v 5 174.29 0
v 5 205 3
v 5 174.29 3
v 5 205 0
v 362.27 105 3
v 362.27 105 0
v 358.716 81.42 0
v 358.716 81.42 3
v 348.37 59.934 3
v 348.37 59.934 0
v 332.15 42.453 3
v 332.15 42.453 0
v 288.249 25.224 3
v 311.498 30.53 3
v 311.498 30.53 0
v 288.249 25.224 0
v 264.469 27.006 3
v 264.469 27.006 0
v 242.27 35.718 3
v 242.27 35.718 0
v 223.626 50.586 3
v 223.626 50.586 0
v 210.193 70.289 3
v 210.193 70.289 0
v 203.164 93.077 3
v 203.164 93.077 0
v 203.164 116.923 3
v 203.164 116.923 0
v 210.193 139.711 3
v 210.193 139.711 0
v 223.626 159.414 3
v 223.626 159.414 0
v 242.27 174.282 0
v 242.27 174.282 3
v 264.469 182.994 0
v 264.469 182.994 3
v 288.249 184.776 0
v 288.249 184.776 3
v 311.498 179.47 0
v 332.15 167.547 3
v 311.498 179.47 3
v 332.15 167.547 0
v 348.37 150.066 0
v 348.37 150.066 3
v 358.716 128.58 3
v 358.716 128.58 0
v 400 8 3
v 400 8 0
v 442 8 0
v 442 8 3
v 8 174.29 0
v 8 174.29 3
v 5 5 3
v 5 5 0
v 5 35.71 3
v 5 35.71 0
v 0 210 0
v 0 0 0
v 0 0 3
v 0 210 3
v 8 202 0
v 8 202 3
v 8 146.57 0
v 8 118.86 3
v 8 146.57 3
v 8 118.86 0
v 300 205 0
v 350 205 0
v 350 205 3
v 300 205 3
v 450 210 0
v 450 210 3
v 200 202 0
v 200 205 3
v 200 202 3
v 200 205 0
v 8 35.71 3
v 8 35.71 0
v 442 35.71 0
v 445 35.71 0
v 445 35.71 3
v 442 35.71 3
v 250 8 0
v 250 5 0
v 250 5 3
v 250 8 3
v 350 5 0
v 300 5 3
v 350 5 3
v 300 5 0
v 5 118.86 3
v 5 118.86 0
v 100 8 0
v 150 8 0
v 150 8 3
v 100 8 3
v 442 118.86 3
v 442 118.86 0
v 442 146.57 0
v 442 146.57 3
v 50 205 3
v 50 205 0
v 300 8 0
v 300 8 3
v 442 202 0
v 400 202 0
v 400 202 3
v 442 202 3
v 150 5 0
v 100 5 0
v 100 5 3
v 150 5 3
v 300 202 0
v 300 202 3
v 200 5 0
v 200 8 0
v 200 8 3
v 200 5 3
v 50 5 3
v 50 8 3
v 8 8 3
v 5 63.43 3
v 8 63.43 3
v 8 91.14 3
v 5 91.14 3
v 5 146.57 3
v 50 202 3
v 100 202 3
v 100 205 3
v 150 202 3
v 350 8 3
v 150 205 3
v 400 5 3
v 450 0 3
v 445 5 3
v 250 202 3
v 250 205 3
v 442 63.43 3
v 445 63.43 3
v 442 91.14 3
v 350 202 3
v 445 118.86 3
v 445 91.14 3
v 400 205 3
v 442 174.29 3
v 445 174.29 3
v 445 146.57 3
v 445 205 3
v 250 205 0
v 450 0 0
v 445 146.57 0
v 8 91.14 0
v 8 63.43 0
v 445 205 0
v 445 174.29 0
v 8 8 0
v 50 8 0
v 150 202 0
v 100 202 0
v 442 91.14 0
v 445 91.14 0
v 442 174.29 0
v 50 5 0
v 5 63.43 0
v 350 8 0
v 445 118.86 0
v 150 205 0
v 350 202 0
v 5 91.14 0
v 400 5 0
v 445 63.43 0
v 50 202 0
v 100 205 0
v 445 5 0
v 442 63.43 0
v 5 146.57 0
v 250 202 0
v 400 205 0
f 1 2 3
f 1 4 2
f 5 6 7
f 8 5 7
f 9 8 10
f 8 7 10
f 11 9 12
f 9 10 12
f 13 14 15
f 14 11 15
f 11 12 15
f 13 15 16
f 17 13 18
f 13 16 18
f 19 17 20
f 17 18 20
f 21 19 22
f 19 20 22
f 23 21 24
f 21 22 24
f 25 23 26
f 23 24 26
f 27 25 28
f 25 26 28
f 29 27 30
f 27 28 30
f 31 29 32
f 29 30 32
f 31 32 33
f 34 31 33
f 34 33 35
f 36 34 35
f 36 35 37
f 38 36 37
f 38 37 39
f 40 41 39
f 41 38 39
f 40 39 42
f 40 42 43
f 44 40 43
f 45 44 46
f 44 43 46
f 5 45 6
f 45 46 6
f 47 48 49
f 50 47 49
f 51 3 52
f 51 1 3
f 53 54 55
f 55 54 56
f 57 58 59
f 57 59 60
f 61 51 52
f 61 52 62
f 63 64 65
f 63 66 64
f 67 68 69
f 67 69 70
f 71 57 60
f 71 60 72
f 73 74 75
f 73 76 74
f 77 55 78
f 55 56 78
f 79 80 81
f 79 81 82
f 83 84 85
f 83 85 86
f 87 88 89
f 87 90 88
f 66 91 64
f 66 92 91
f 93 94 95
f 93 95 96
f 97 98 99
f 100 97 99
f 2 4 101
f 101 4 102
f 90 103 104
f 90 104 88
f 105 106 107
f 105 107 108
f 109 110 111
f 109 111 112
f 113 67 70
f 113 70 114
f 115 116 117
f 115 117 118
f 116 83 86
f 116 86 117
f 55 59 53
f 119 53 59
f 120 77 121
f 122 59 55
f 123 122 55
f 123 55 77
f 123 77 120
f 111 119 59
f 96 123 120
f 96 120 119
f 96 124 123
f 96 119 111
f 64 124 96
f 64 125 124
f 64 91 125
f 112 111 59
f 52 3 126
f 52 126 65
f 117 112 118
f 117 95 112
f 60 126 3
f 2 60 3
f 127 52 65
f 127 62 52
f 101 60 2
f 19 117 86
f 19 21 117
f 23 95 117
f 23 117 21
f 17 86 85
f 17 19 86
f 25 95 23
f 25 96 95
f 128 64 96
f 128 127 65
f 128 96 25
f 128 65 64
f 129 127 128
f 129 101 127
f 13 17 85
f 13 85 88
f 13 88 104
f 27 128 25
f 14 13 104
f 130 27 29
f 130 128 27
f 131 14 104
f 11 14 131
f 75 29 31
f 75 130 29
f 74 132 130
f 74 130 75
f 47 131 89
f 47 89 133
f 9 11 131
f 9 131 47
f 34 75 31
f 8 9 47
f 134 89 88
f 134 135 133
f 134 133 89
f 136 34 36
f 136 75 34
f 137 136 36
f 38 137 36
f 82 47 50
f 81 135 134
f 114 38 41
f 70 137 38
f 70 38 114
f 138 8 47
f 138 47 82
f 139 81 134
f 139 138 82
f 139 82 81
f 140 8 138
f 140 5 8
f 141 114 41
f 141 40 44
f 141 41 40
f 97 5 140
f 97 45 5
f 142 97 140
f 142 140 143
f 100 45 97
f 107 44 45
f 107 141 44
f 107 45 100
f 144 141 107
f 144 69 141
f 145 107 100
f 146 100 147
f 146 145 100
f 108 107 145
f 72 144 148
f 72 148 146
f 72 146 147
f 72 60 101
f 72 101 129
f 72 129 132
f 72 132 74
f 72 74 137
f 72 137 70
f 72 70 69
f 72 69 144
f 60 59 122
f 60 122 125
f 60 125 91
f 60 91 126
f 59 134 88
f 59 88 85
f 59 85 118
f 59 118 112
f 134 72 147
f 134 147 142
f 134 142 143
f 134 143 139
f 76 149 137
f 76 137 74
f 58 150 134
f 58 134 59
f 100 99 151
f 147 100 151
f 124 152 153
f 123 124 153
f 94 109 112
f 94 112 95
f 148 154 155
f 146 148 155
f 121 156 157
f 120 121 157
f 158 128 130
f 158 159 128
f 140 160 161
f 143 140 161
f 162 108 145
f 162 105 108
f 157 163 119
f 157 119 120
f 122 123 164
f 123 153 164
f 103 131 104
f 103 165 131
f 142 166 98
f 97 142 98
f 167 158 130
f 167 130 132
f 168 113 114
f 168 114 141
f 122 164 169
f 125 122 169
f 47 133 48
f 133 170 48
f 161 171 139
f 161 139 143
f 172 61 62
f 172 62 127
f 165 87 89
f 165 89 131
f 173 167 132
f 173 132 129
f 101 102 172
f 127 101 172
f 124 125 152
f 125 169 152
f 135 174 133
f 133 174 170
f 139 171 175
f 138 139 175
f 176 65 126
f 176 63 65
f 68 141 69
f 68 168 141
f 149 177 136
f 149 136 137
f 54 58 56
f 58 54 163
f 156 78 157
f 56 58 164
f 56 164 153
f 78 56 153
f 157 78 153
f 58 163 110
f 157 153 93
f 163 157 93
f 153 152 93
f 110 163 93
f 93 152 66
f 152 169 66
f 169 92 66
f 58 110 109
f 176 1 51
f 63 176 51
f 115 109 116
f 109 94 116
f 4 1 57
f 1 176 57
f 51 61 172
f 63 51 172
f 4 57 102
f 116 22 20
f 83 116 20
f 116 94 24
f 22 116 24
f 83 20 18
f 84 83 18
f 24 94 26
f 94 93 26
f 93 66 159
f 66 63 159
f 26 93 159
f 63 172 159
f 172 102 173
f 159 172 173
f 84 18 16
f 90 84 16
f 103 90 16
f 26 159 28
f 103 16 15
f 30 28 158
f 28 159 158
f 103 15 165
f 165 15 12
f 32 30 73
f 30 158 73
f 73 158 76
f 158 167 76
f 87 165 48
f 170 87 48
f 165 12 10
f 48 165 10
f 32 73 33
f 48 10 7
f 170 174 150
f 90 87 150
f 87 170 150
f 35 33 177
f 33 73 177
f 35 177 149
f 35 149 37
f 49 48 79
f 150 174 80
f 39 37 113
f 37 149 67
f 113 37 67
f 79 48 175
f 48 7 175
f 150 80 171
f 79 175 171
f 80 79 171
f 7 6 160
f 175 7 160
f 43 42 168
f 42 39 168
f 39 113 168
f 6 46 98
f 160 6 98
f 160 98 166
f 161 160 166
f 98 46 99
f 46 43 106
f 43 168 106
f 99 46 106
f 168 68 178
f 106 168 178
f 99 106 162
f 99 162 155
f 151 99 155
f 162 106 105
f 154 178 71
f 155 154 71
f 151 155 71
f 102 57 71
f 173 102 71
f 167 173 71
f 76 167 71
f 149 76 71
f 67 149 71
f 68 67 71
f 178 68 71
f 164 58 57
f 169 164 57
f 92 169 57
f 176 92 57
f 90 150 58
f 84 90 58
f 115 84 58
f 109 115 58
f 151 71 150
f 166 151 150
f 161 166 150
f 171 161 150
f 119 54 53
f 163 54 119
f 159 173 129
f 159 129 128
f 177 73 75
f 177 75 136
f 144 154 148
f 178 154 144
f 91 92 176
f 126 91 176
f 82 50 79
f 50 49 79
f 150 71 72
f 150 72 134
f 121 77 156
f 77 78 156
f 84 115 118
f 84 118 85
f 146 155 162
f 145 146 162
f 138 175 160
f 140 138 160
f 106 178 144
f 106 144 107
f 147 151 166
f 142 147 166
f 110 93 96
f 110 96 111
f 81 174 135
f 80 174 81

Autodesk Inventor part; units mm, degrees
ref_plane "YZ Plane" through (0, 0, 0) normal (1, 0, 0) x (0, 1, 0)
ref_plane "XZ Plane" through (0, 0, 0) normal (0, 1, 0) x (-1, 0, 0)
ref_plane "XY Plane" through (0, 0, 0) normal (0, 0, 1) x (1, 0, 0)
sketch "Boceto1" plane through (0, 0, 0) normal (0, 0, 1) x (1, 0, 0)
  line L0 (0, 0) -> (0, 210)
  line L1 (0, 210) -> (450, 210)
  line L2 (450, 210) -> (450, 0)
  line L3 (450, 0) -> (0, 0)
  line L4 (0, 210) -> (5, 210)
  line L5 (5, 205) -> (50, 205)
  line L6 (50, 205) -> (50, 202)
  line L7 (5, 205) -> (5, 174.29)
  line L8 (5, 174.29) -> (8, 174.29)
  line L9 (8, 174.29) -> (8, 202)
  line L10 (8, 202) -> (50, 202)
  line L11 (0, 0) -> (5, 0)
  line L12 (0, 0) -> (5, 0)
  line L13 (5, 5) -> (50, 5)
  line L14 (5, 5) -> (5, 35.71)
  line L15 (5, 35.71) -> (8, 35.71)
  line L16 (50, 5) -> (50, 8)
  line L17 (8, 35.71) -> (8, 8)
  line L18 (8, 8) -> (50, 8)
  line L19 (450, 0) -> (445, 0)
  line L20 (445, 5) -> (445, 35.71)
  line L21 (445, 35.71) -> (442, 35.71)
  line L22 (445, 5) -> (400, 5)
  line L23 (400, 5) -> (400, 8)
  line L24 (400, 8) -> (442, 8)
  line L25 (442, 8) -> (442, 35.71)
  line L26 (450, 210) -> (445, 210)
  line L27 (445, 205) -> (400, 205)
  line L28 (445, 205) -> (445, 174.29)
  line L29 (445, 174.29) -> (442, 174.29)
  line L30 (400, 205) -> (400, 202)
  line L31 (400, 202) -> (442, 202)
  line L32 (442, 202) -> (442, 174.29)
  line L33 (5, 63.43) -> (5, 91.14)
  line L34 (5, 91.14) -> (8, 91.14)
  line L35 (8, 91.14) -> (8, 63.43)
  line L36 (8, 63.43) -> (5, 63.43)
  line L37 (5, 118.86) -> (5, 146.57)
  line L38 (5, 118.86) -> (8, 118.86)
  line L39 (8, 118.86) -> (8, 146.57)
  line L40 (8, 146.57) -> (5, 146.57)
  line L41 (445, 63.43) -> (445, 91.14)
  line L42 (445, 63.43) -> (442, 63.43)
  line L43 (442, 63.43) -> (442, 91.14)
  line L44 (442, 91.14) -> (445, 91.14)
  line L45 (445, 118.86) -> (442, 118.86)
  line L46 (442, 118.86) -> (442, 146.57)
  line L47 (442, 146.57) -> (445, 146.57)
  line L48 (445, 146.57) -> (445, 118.86)
  line L49 (350, 205) -> (300, 205)
  line L50 (300, 205) -> (300, 202)
  line L51 (300, 202) -> (350, 202)
  line L52 (350, 202) -> (350, 205)
  line L53 (250, 205) -> (200, 205)
  line L54 (200, 205) -> (200, 202)
  line L55 (200, 202) -> (250, 202)
  line L56 (250, 202) -> (250, 205)
  line L57 (150, 205) -> (100, 205)
  line L58 (100, 205) -> (100, 202)
  line L59 (100, 202) -> (150, 202)
  line L60 (150, 202) -> (150, 205)
  line L61 (350, 8) -> (300, 8)
  line L62 (300, 8) -> (300, 5)
  line L63 (300, 5) -> (350, 5)
  line L64 (350, 5) -> (350, 8)
  line L65 (250, 8) -> (200, 8)
  line L66 (200, 8) -> (200, 5)
  line L67 (200, 5) -> (250, 5)
  line L68 (250, 5) -> (250, 8)
  line L69 (150, 8) -> (100, 8)
  line L70 (100, 8) -> (100, 5)
  line L71 (100, 5) -> (150, 5)
  line L72 (150, 5) -> (150, 8)
  point P0 (450, 30)
  dimension "d8" = 210
  dimension "d9" = 210
  dimension "d10" = 5
  dimension "d11" = 27.72
  dimension "d12" = 5
  dimension "d13" = 5
  dimension "d14" = 450
  dimension "d15" = 5
  dimension "d16" = 5
  dimension "d17" = 5
  dimension "d18" = 45
  dimension "d19" = 30.71
  dimension "d20" = 3
  dimension "d21" = 3
  dimension "d22" = 30.71
  dimension "d23" = 45
  dimension "d24" = 3
  dimension "d25" = 3
  dimension "d26" = 5
  dimension "d27" = 5
  dimension "d29" = 5
  dimension "d30" = 30.71
  dimension "d31" = 45
  dimension "d32" = 5
  dimension "d33" = 3
  dimension "d34" = 3
  dimension "d35" = 5
  dimension "d36" = 5
  dimension "d37" = 45
  dimension "d38" = 30.71
  dimension "d39" = 3
  dimension "d40" = 3
  dimension "d41" = 50
  dimension "d42" = 5
  dimension "d43" = 5
  dimension "d44" = 5
  dimension "d45" = 3
  dimension "d46" = 3
sketch "Boceto2" plane through (0, 0, 0) normal (0, 0, 1) x (1, 0, 0)
  line L0 (449.8604, 0) -> (282.2704, 0)
  circle A0 centre (282.2704, 105) radius 80
  point P0 (0, 0)
extrude "Extrusión1" add sketch "Boceto1" along normal blind 3
extrude "Extrusión2" cut sketch "Boceto2" along normal blind 3
properties part number "Pieza agujero" material "Madera (nogal)"
